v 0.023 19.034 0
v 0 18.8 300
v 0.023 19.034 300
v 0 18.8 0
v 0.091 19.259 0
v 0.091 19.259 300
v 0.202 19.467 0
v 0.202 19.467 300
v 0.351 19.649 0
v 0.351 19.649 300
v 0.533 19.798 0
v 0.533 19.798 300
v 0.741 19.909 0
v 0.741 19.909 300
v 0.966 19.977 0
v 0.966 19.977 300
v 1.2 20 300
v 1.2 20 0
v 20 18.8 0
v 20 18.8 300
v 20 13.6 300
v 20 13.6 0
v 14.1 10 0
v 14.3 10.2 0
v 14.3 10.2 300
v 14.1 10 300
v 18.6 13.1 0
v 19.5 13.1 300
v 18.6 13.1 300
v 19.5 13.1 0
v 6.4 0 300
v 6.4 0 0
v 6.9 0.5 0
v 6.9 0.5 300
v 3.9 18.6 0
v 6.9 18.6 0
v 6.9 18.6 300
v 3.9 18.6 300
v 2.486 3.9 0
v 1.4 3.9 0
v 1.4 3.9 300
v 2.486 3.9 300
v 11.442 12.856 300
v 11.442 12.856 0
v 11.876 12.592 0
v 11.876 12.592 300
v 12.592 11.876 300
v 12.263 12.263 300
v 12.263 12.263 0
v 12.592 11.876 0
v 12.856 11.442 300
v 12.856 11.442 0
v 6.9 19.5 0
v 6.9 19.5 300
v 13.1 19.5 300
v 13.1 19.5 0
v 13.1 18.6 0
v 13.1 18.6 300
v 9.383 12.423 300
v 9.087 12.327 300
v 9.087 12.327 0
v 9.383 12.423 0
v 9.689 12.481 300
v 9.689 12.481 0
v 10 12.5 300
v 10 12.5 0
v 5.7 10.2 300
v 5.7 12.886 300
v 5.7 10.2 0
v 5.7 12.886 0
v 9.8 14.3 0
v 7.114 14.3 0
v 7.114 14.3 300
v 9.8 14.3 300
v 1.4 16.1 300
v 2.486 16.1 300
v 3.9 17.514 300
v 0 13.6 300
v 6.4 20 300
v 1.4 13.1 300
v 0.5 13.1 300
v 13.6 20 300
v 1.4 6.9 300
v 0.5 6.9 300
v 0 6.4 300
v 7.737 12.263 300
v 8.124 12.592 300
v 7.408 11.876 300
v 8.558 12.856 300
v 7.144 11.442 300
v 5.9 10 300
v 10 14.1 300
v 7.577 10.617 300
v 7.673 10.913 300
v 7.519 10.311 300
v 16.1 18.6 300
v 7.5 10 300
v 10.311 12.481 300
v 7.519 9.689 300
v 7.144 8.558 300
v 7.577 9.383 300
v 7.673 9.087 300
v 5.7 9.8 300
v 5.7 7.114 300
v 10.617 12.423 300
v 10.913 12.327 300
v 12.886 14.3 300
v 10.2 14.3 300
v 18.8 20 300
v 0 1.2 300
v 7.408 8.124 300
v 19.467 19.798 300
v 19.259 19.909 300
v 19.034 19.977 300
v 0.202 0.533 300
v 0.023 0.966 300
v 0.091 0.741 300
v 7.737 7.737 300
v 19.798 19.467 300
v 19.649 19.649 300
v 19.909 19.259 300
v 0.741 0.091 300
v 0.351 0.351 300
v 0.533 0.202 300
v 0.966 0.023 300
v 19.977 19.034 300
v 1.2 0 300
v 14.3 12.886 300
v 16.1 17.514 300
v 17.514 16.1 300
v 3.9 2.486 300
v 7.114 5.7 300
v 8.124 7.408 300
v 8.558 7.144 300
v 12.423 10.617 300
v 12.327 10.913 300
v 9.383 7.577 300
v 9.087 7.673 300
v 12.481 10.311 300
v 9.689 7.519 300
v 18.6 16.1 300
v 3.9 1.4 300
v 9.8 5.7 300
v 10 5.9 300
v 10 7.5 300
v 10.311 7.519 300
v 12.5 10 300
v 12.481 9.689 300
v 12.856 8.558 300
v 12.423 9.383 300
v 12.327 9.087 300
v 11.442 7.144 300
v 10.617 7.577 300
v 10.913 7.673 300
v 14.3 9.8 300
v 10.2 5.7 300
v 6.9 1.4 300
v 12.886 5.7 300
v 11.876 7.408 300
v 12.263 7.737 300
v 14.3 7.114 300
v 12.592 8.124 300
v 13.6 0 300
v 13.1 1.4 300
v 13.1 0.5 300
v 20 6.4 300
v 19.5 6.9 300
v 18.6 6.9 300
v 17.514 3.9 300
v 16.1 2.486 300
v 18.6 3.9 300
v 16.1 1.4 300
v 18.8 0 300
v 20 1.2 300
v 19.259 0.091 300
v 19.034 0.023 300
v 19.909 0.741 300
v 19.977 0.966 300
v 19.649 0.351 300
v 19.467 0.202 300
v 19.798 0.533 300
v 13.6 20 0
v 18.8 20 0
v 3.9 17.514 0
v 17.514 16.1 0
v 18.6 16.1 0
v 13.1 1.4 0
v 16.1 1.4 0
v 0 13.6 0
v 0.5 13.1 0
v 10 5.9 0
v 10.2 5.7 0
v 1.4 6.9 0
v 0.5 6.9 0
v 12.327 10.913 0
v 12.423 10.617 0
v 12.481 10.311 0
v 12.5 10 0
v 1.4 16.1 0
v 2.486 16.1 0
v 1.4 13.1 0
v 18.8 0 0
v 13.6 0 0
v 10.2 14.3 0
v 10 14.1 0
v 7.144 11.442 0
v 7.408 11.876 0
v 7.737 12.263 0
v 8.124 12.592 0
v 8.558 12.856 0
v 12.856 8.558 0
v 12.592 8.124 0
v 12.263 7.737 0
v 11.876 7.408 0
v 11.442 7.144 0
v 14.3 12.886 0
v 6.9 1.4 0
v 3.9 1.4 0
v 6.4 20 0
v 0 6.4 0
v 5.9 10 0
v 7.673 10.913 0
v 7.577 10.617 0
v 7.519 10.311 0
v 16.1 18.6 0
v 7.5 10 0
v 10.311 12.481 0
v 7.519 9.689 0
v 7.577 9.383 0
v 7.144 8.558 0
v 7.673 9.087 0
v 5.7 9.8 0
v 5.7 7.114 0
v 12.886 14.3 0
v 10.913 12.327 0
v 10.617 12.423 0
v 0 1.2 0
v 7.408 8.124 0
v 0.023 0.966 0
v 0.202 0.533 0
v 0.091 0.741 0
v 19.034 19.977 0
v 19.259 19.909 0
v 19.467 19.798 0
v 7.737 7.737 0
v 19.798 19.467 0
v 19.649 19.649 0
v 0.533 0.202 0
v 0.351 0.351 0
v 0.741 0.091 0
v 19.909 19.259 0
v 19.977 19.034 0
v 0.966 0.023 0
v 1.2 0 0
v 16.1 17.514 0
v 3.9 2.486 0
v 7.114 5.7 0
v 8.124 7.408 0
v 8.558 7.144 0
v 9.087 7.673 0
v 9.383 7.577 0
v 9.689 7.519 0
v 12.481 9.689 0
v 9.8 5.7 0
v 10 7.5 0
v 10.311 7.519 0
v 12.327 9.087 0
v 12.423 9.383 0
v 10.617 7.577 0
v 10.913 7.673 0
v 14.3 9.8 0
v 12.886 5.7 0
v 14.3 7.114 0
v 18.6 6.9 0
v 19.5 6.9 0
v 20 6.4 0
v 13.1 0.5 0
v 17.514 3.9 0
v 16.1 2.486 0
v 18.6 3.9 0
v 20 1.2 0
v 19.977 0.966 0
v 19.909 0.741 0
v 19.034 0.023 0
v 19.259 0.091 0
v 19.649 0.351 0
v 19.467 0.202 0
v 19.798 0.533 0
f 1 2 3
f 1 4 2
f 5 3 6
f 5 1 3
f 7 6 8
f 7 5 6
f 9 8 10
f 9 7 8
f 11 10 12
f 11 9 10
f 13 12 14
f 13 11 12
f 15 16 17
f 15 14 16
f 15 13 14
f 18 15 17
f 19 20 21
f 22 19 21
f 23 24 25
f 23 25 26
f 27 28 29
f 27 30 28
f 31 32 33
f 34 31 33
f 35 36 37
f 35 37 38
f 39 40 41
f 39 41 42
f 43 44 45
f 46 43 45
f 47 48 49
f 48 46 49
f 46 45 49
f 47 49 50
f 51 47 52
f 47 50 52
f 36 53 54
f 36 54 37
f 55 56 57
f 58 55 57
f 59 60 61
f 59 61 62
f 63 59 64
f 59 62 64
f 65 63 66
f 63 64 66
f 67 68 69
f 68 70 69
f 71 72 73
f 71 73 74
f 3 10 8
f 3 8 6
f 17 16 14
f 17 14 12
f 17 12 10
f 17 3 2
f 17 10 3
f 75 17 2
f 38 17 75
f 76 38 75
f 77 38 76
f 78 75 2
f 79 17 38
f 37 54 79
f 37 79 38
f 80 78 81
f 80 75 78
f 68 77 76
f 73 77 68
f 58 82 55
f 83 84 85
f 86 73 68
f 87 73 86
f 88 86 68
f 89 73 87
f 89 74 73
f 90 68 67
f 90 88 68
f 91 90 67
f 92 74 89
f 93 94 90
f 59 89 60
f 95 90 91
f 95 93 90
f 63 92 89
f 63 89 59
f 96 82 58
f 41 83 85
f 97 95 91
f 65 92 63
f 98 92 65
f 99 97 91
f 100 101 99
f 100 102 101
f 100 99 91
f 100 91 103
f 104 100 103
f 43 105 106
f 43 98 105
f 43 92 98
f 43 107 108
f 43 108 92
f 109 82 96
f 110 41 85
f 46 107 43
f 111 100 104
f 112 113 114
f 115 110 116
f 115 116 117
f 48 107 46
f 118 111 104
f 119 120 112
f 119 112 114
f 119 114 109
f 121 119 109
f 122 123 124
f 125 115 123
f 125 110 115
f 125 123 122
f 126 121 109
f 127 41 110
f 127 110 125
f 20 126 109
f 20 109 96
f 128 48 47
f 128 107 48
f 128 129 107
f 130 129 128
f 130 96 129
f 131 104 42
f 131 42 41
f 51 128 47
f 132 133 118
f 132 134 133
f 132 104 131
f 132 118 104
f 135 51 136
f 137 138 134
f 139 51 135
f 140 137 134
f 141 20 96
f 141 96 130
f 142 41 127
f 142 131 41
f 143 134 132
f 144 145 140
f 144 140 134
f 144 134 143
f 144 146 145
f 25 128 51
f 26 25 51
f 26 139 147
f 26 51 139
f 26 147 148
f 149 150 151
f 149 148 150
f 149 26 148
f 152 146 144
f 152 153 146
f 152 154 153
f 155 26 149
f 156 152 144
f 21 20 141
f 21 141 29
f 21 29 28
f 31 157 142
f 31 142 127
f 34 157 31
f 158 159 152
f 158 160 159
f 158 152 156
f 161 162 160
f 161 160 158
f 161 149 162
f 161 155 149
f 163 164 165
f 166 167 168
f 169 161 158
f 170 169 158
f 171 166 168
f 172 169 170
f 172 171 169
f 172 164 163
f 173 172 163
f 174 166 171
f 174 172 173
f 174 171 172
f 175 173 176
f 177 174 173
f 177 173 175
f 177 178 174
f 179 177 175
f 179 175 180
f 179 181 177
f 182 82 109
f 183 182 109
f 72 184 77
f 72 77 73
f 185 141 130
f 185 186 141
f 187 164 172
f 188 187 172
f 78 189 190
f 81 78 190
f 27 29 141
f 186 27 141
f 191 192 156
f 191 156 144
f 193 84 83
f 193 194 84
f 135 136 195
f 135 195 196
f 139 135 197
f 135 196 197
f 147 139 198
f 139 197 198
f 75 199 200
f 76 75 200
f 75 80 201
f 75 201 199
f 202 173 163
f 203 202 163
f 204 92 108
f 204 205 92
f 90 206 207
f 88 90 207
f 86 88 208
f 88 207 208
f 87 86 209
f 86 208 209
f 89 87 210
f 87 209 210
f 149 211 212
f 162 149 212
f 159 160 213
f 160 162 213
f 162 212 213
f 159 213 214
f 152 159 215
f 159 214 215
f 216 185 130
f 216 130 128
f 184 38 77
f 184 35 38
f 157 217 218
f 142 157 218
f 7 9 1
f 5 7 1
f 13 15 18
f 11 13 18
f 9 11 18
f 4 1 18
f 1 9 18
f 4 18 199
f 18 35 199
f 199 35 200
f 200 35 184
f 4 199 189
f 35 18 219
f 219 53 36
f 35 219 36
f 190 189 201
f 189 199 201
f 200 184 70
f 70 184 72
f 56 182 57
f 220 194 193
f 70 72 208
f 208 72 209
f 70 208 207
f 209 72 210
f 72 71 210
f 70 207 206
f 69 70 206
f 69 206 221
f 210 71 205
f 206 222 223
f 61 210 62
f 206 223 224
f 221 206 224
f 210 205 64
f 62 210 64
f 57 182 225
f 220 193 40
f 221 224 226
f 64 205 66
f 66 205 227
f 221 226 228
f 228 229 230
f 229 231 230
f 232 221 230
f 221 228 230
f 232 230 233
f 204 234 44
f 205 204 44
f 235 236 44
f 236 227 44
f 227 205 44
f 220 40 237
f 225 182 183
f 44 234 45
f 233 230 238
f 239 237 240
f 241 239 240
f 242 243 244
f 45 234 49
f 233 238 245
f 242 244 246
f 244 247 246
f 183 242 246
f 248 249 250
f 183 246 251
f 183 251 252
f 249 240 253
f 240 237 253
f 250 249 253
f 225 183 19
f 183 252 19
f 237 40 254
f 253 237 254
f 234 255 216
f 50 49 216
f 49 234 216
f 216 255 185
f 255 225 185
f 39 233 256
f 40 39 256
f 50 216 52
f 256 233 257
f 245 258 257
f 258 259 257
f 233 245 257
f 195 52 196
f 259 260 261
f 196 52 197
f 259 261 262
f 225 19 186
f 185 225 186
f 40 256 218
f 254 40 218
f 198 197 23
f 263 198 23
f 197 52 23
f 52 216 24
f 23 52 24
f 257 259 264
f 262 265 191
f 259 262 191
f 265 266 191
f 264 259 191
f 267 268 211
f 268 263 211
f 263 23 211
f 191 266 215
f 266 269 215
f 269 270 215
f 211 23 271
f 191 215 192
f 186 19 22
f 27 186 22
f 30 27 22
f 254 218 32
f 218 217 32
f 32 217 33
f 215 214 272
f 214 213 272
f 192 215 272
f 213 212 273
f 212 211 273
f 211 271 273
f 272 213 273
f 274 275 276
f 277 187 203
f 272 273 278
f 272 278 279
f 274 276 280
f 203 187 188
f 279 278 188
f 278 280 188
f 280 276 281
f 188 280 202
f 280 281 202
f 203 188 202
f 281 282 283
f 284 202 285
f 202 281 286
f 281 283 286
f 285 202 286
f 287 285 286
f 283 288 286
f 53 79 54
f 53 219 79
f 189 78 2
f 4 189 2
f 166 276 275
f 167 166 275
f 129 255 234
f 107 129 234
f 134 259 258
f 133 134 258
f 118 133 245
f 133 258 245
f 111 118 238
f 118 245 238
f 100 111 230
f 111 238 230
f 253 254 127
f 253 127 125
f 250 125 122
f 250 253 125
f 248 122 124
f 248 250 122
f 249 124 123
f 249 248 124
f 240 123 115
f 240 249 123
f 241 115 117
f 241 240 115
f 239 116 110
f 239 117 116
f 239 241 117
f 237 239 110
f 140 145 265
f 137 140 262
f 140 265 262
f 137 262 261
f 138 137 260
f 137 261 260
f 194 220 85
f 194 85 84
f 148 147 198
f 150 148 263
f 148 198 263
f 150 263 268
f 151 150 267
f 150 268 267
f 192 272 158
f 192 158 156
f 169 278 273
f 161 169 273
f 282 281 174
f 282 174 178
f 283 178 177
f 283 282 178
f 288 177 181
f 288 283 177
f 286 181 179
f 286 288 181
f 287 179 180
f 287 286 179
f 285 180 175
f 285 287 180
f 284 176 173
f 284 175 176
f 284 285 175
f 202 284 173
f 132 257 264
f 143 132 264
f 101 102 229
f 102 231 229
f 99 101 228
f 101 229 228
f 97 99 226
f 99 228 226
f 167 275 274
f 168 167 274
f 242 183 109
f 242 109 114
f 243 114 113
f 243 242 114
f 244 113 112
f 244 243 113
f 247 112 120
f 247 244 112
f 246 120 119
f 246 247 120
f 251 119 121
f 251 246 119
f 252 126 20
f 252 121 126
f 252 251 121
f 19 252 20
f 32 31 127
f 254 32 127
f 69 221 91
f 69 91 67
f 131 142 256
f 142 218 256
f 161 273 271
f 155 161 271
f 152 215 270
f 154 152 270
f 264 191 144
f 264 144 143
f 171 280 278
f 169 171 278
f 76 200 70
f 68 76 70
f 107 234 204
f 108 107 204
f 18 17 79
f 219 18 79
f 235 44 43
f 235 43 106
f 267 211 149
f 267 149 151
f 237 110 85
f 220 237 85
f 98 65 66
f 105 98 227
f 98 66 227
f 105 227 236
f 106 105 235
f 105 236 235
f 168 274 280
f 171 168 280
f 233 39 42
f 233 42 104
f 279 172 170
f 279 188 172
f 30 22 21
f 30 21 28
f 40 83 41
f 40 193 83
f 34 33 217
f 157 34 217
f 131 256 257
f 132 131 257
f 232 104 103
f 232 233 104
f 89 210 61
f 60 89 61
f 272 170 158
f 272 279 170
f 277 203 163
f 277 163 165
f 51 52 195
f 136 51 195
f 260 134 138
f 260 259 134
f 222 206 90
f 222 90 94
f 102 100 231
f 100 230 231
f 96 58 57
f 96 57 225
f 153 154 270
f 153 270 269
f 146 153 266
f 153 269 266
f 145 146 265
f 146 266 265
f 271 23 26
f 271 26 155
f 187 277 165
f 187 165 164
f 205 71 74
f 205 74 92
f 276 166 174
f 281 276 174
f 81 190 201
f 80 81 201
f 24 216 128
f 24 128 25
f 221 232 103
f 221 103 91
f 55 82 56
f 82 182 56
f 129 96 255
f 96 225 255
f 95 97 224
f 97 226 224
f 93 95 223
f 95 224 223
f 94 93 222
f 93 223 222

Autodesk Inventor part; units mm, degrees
ref_plane "YZ Plane" through (0, 0, 0) normal (1, 0, 0) x (0, 1, 0)
ref_plane "XZ Plane" through (0, 0, 0) normal (0, 1, 0) x (-1, 0, 0)
ref_plane "XY Plane" through (0, 0, 0) normal (0, 0, 1) x (1, 0, 0)
sketch "Sketch1" plane through (0, 0, 0) normal (0, 0, 1) x (1, 0, 0)
  line L0 (6.4, 0) -> (1.2, 0)
  line L1 (0, 1.2) -> (0, 6.4)
  line L2 (0.5, 6.9) -> (1.4, 6.9)
  line L3 (1.4, 6.9) -> (1.4, 3.9)
  line L4 (2.4858, 3.9) -> (5.7, 7.1142)
  line L5 (5.7, 7.1142) -> (5.7, 9.8)
  line L6 (3.9, 2.4858) -> (7.1142, 5.7)
  line L7 (7.1142, 5.7) -> (9.8, 5.7)
  line L8 (7.1435, 8.5577) -> (7.6727, 9.0869)
  line L9 (8.5577, 7.1435) -> (9.0869, 7.6727)
  line L10 (6.9, 0.5) -> (6.9, 1.4)
  line L11 (6.9, 1.4) -> (3.9, 1.4)
  line L12 (5.9, 10) -> (24.7723, 10) construction
  line L13 (10, 21.5486) -> (10, 5.9) construction
  line L14 (1.4, 3.9) -> (2.4858, 3.9)
  line L15 (3.9, 1.4) -> (3.9, 2.4858)
  arc A0 (7.5, 10) -> (7.6727, 9.0869) centre (10, 10) ccw
  arc A1 (9.0869, 7.6727) -> (10, 7.5) centre (10, 10) ccw
  line L16 (14.358, 14.358) -> (-3.5262, -3.5262) construction
  arc A2 (7.1435, 8.5577) -> (8.5577, 7.1435) centre (10, 10) ccw
  line L17 (7.5, 10) -> (5.9, 10)
  line L18 (10, 7.5) -> (10, 5.9)
  arc A3 (0, 1.2) -> (1.2, 0) centre (1.2, 1.2) ccw
  line L19 (0, 6.4) -> (0.5, 6.9)
  line L20 (6.4, 0) -> (6.9, 0.5)
  line L21 (5.7, 9.8) -> (5.9, 10)
  line L22 (10, 5.9) -> (9.8, 5.7)
  point P0 (0, 0)
  point P1 (6.9, 0)
  point P2 (0, 6.9)
  point P3 (5.7, 10)
  point P4 (10, 5.7)
  dimension "d0" = 10
  dimension "d1" = 10
  dimension "d3" = 1.4
  dimension "d4" = 6.1
  dimension "d5" = 6.1
  dimension "d6" = 3.1
  dimension "d7" = 3.1
  dimension "d9" = 5.7
  dimension "d10" = 5.7
  dimension "d12" = 2
  dimension "d14" = 2.5
  dimension "d15" = 3.2
  dimension "d21" = 1.2
  dimension "d22" = 0.5
  dimension "d23" = 0.5
  dimension "d24" = 0.5
  dimension "d25" = 0.5
  dimension "d26" = 0.2
  dimension "d27" = 0.2
  dimension "d28" = 0.2
  dimension "d29" = 0.2
extrude "Extrusion2" add sketch "Sketch1" along normal blind 300
pattern_circular "Circular Pattern2" count 4 over 360 about axis through (10, 10, 300) along (0, 0, 1) of "Extrusion2"
equation "\"d5\" = d4"
equation "\"d7\" = d6"
equation "\"d10\" = d9"
equation "\"d23\" = d22"
equation "\"d24\" = d22"
equation "\"d25\" = d24"
equation "\"d27\" = d26"
equation "\"d28\" = d26"
equation "\"d29\" = d28"
properties part number "profile"
